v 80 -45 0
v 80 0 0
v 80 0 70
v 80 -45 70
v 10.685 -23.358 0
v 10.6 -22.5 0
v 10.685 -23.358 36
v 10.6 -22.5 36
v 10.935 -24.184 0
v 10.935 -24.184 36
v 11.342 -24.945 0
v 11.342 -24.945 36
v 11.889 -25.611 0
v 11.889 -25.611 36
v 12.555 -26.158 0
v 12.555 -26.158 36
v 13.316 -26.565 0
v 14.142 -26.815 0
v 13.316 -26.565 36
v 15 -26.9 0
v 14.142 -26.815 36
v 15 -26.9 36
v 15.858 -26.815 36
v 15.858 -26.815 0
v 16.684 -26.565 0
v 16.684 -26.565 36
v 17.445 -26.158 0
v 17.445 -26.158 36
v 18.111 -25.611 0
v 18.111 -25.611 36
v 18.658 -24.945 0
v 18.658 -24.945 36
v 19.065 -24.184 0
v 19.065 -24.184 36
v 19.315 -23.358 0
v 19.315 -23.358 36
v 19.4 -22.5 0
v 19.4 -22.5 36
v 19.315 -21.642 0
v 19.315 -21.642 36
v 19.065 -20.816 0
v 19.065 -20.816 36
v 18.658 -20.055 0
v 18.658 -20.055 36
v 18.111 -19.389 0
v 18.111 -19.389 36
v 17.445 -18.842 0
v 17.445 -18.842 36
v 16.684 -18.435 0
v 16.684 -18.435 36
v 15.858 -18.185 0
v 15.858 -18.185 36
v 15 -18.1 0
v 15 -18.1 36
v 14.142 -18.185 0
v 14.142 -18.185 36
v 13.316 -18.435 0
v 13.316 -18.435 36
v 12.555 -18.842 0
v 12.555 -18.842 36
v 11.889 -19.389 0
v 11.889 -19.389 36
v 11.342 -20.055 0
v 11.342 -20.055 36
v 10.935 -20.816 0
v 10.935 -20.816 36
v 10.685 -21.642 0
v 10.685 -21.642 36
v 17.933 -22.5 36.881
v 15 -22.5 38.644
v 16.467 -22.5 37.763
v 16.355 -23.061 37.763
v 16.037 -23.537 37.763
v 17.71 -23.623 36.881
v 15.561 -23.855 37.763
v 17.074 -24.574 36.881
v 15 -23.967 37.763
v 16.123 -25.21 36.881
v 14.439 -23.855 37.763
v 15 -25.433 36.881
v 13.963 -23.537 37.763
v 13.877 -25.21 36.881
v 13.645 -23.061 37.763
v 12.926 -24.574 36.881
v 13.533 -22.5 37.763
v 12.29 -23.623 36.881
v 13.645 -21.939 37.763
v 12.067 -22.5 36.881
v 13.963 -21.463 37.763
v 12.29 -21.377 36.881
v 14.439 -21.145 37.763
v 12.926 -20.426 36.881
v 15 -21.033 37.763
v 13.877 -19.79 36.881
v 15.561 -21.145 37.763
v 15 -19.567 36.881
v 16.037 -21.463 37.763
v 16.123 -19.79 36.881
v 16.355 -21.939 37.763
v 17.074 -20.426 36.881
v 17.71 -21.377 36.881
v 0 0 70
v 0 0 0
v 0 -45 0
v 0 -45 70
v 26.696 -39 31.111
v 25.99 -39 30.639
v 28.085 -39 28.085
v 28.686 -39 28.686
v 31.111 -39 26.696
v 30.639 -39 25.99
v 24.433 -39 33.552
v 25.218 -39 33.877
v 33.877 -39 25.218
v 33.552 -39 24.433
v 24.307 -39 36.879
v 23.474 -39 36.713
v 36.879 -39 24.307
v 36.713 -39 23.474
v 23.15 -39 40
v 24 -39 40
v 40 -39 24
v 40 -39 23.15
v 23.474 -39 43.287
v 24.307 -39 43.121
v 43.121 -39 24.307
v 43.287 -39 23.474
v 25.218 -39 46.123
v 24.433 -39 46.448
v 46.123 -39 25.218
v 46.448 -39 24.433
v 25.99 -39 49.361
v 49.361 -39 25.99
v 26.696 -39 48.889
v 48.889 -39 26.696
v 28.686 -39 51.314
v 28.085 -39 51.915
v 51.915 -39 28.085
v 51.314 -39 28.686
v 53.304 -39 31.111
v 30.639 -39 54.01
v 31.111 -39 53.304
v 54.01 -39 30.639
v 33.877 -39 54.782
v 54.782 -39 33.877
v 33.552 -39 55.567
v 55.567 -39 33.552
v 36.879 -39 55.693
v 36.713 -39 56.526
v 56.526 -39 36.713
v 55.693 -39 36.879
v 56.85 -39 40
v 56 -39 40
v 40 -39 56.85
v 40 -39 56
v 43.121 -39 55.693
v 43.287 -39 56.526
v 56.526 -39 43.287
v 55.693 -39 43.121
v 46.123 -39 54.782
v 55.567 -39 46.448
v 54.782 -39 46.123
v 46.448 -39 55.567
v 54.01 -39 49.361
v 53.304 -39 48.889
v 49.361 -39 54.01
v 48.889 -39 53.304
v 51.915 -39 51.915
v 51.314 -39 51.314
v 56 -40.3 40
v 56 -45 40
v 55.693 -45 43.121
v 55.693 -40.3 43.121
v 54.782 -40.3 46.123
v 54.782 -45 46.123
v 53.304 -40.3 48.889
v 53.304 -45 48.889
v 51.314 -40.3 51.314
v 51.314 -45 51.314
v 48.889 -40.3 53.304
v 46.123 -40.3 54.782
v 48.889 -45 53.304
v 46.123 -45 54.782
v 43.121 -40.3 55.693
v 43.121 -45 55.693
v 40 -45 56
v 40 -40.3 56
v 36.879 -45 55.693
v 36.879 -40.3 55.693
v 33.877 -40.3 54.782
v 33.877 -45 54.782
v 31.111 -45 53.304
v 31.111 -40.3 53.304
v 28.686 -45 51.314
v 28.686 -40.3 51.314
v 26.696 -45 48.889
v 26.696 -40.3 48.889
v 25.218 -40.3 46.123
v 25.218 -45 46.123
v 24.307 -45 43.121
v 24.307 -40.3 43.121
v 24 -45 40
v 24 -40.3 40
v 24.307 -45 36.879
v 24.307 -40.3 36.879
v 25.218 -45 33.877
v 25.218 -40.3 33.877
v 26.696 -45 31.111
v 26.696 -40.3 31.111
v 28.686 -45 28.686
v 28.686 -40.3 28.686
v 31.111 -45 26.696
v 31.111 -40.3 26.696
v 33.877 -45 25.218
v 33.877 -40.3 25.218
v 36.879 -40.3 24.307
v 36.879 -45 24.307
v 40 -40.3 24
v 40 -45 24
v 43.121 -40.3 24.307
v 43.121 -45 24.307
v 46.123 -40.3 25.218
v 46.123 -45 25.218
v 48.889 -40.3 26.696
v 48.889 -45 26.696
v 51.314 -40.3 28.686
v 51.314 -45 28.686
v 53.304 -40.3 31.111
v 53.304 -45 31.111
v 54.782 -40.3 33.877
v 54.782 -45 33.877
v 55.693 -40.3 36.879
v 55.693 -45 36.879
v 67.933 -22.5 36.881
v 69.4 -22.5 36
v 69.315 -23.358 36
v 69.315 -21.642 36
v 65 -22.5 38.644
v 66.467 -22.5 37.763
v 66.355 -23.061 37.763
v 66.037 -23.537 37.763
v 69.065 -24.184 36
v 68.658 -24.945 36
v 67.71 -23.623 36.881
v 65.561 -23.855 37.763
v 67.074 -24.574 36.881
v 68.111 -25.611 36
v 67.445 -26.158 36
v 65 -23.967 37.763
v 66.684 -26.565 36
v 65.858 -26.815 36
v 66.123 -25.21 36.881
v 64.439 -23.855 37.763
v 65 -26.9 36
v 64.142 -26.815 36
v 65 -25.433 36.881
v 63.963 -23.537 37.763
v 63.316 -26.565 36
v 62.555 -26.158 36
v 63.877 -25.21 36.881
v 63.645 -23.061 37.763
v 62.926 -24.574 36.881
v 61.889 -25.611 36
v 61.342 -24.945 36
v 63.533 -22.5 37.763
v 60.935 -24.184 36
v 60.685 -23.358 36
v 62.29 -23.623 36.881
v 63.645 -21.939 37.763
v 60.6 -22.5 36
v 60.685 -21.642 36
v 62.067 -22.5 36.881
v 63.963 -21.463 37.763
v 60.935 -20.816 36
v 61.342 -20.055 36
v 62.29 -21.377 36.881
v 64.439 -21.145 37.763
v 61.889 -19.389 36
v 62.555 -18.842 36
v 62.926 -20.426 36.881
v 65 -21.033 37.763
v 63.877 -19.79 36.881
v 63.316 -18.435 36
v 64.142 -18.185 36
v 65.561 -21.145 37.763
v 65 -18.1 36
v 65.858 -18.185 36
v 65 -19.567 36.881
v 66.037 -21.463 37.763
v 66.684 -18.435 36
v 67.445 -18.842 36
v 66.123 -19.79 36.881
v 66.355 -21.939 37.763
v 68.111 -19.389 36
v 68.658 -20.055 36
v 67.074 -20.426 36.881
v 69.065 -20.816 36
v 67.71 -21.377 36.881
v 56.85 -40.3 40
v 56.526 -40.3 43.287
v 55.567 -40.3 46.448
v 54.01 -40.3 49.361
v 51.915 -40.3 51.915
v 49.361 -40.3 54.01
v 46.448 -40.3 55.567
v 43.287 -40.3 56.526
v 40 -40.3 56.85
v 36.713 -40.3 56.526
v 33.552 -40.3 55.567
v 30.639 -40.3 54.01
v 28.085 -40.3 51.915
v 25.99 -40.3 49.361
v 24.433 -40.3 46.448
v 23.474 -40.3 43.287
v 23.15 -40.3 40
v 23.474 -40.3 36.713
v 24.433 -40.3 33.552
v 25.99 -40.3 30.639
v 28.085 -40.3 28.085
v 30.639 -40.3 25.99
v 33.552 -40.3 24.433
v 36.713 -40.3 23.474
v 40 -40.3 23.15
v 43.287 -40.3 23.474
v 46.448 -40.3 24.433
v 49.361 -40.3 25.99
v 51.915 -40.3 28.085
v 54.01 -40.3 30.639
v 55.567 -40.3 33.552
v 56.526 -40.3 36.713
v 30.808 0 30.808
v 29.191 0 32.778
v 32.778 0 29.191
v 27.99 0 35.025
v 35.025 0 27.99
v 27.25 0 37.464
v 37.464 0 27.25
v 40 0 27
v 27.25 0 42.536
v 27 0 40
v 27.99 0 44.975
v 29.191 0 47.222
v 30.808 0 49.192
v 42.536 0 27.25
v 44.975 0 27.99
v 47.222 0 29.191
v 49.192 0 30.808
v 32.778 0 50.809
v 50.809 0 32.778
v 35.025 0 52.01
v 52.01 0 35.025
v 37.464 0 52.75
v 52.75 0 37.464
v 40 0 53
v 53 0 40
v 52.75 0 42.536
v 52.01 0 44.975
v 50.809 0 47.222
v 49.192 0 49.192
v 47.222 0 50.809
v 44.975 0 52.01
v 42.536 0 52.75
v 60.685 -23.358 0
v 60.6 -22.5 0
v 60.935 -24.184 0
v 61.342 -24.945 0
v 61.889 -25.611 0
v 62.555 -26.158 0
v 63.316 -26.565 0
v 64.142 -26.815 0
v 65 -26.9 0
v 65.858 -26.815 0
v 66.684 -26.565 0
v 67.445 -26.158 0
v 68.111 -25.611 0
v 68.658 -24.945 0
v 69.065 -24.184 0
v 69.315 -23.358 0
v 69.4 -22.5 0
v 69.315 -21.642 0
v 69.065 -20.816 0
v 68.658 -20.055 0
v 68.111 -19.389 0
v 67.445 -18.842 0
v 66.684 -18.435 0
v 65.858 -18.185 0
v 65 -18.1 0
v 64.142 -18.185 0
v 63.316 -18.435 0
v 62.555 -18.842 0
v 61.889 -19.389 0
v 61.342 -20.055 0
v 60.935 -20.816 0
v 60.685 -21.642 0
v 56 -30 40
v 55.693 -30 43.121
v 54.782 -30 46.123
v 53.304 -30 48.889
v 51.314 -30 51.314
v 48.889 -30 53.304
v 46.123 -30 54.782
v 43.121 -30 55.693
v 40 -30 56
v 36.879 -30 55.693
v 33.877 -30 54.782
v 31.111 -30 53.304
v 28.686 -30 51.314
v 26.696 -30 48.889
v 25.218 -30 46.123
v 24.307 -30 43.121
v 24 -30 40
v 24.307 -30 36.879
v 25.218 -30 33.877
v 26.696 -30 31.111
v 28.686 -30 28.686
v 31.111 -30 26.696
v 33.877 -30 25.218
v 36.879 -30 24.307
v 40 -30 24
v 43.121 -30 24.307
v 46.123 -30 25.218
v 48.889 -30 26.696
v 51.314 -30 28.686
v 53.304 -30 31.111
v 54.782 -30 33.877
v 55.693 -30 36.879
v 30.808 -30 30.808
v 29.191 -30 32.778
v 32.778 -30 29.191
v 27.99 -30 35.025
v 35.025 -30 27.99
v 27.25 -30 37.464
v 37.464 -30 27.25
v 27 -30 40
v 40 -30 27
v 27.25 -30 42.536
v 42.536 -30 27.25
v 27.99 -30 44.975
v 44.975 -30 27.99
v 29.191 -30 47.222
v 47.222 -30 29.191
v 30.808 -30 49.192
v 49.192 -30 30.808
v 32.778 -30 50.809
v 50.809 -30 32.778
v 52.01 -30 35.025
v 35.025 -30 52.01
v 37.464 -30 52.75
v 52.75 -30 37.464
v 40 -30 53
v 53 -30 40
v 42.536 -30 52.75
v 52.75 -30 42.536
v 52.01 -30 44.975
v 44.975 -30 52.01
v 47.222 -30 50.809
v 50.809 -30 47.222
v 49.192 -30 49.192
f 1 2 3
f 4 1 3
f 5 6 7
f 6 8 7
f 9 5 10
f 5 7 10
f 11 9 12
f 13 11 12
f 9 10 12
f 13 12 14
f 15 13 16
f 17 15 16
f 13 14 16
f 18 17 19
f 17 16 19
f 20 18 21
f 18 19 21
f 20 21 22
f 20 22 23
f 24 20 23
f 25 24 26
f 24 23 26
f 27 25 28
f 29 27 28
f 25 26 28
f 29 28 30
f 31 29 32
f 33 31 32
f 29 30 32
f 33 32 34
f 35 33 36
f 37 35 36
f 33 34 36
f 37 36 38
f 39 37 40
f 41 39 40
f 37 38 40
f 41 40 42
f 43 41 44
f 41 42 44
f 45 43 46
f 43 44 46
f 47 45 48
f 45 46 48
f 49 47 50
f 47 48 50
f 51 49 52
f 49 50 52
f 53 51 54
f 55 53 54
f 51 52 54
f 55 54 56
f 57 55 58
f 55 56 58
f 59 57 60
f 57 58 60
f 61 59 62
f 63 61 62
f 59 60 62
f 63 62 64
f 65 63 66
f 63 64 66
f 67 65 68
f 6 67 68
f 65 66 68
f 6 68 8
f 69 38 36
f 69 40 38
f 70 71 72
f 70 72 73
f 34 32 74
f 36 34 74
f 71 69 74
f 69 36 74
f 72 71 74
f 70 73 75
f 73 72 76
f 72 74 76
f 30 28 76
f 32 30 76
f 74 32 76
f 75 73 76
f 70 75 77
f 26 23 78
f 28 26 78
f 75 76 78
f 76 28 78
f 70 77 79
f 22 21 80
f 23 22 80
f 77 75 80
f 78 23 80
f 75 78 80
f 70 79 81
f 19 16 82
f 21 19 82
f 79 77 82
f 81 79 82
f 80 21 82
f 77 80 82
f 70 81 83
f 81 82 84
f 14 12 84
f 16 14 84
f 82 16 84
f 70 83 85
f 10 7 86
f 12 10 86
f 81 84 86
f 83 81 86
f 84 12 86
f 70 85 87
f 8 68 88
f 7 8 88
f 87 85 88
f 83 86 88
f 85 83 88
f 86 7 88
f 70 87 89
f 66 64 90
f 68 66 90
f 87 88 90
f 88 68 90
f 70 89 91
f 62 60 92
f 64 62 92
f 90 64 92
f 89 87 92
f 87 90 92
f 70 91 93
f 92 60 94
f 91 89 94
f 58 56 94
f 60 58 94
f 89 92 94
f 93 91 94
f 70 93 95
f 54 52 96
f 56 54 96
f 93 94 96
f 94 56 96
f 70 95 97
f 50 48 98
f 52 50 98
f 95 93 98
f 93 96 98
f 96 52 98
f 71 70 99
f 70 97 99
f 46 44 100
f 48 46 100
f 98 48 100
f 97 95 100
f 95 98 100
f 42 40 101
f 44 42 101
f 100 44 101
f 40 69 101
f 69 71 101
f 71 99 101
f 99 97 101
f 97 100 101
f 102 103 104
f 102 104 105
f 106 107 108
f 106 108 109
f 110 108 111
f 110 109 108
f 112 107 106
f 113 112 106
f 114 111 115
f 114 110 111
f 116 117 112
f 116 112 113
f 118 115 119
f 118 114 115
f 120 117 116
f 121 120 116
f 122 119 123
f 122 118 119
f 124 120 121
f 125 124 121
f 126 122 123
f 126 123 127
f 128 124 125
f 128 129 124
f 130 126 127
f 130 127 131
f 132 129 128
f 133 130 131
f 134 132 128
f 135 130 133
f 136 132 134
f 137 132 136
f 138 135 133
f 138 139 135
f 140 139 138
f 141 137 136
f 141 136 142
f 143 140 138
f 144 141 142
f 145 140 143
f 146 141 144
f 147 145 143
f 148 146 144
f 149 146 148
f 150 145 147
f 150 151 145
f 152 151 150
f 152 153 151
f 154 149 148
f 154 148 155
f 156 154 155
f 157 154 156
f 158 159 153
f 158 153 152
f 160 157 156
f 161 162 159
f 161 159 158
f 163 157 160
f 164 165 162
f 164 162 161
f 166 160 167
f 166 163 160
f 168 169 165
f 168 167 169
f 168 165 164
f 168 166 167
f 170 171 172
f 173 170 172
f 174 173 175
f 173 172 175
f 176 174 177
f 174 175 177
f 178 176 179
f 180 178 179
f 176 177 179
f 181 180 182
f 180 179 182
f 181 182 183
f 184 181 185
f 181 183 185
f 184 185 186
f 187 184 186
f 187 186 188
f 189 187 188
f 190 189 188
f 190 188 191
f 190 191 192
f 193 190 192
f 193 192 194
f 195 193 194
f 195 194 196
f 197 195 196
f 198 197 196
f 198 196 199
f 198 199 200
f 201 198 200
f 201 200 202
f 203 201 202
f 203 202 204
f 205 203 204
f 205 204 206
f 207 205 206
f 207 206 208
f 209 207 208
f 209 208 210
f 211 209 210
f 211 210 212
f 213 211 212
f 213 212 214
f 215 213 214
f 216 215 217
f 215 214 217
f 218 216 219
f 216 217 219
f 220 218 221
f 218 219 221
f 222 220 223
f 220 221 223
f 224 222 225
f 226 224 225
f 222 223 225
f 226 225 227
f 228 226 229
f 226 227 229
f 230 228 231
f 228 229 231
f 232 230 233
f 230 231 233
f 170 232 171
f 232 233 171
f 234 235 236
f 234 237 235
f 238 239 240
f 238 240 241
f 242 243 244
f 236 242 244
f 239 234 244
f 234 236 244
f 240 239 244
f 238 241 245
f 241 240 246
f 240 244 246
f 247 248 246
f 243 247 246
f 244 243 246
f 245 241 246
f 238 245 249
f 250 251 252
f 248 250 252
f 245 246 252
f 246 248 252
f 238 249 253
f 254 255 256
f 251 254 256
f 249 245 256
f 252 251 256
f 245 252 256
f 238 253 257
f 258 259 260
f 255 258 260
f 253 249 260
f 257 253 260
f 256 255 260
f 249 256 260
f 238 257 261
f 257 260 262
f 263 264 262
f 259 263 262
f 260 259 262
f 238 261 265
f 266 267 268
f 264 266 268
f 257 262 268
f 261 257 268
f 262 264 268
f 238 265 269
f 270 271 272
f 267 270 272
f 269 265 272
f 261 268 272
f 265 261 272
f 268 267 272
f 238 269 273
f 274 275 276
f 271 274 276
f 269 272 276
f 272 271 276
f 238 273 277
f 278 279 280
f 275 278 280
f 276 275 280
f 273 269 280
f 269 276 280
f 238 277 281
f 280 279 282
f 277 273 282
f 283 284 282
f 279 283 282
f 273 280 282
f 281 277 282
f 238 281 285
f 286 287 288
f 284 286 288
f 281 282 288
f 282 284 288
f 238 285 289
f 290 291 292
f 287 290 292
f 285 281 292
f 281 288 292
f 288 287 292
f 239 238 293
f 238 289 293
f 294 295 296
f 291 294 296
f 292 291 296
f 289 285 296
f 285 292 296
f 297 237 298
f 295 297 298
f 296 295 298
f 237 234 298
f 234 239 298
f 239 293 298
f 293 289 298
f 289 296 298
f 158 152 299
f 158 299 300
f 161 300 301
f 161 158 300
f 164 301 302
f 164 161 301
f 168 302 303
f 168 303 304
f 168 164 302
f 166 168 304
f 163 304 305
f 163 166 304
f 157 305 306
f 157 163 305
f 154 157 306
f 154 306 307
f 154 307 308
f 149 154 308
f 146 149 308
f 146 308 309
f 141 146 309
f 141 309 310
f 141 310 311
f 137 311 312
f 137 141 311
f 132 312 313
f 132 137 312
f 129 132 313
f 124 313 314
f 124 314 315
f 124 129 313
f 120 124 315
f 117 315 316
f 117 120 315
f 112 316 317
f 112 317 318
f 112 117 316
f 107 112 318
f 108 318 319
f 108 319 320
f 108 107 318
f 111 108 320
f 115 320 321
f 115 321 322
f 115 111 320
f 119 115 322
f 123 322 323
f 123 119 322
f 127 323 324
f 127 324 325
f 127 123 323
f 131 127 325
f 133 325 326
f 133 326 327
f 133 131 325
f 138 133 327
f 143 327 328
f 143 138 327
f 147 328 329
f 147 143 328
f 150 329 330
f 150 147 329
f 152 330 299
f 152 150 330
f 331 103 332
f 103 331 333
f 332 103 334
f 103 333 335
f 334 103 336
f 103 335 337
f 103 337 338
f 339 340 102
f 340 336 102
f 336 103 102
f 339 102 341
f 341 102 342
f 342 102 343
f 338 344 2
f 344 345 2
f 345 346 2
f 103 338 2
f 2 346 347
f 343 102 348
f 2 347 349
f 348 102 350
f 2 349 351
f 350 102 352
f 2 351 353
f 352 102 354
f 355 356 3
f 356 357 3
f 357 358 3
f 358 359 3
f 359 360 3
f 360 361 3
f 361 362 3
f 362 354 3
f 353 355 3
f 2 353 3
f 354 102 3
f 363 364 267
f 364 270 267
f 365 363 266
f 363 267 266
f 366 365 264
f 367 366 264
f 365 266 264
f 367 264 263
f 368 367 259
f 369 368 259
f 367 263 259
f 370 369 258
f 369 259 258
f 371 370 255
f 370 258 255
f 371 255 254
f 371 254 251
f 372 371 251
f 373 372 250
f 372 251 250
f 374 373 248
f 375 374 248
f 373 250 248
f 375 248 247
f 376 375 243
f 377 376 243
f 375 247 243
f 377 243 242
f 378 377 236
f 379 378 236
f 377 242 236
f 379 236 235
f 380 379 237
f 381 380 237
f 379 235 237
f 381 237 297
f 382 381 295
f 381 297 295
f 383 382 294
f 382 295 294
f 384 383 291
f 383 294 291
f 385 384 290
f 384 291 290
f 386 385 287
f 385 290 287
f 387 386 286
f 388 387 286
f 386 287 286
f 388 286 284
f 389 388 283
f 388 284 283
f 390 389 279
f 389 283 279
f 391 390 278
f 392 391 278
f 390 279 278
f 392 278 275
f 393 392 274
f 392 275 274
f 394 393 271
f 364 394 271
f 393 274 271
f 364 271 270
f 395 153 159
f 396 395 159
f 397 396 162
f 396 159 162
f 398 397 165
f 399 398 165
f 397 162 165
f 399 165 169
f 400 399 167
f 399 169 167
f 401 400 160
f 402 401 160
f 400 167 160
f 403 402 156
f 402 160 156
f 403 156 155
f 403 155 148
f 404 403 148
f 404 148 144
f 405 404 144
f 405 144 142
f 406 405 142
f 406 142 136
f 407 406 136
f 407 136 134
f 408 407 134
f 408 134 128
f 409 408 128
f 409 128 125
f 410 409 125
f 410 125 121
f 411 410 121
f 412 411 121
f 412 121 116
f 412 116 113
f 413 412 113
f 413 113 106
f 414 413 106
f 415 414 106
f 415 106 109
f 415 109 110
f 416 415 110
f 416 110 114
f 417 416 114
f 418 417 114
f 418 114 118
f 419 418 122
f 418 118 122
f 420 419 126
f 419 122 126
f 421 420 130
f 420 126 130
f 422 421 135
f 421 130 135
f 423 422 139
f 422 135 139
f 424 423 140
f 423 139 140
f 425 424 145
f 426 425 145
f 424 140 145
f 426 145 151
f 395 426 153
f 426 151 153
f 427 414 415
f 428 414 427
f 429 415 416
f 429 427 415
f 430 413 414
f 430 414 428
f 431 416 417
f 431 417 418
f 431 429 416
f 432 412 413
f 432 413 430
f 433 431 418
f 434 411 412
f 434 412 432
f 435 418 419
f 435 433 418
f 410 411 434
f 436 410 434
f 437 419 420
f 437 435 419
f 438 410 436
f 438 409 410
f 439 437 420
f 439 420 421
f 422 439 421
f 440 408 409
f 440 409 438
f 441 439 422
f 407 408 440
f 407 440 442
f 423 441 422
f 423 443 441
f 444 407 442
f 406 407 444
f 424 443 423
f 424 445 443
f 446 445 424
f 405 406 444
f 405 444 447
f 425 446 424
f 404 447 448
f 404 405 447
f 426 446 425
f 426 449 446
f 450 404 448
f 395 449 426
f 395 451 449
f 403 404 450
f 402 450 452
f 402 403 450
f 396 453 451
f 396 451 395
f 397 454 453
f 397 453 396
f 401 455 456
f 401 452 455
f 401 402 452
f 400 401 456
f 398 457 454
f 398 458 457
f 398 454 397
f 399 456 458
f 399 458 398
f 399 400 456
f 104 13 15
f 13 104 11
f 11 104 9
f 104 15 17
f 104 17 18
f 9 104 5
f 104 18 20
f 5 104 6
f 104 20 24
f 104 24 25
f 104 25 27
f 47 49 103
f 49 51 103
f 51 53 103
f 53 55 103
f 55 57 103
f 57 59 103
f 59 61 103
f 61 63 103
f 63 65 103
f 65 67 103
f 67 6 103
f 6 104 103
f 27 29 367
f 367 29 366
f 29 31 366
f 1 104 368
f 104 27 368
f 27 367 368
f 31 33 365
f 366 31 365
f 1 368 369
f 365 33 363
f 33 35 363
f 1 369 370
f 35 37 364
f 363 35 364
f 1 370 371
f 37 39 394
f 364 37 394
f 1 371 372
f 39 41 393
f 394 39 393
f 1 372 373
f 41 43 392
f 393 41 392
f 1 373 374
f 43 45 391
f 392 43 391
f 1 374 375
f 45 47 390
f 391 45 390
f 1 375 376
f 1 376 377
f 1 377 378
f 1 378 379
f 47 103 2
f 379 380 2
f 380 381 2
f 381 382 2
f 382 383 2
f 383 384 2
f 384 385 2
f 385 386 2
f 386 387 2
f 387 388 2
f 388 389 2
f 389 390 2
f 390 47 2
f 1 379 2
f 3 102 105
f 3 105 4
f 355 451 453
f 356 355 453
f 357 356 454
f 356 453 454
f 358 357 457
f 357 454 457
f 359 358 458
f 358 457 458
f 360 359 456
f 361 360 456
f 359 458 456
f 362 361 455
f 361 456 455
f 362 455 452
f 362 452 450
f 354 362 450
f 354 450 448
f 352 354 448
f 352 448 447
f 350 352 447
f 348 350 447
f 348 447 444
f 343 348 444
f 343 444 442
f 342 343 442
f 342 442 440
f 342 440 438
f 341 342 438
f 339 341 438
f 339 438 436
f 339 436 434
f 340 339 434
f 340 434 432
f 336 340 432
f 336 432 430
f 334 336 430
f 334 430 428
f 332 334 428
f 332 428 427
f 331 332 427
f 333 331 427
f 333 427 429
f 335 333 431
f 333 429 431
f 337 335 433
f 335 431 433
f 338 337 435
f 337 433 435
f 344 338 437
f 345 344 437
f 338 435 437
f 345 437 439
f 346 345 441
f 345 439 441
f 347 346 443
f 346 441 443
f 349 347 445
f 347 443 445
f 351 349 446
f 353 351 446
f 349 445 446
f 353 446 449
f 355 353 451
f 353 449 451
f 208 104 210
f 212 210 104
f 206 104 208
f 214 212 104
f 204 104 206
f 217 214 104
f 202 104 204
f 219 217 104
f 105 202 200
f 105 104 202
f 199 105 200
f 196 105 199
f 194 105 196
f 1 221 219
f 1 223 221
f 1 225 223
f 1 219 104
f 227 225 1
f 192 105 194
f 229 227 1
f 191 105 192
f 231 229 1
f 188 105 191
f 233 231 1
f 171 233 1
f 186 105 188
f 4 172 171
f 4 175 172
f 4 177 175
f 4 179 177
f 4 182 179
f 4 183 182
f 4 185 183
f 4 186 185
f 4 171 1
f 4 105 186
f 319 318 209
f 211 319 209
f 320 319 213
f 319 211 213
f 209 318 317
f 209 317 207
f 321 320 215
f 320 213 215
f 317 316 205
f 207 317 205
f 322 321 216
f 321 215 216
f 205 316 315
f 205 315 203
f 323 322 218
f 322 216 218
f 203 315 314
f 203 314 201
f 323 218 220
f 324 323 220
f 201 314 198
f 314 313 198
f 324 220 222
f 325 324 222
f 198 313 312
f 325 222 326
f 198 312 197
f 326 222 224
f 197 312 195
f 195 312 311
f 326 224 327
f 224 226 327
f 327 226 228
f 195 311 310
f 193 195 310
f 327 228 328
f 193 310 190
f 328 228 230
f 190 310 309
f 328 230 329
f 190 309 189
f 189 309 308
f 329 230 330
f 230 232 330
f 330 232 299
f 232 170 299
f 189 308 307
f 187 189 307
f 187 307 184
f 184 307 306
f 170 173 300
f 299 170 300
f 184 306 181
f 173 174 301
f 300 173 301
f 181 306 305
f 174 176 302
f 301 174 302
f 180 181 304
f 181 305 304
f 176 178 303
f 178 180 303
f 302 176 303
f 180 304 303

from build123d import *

# Parameters (mm, degrees)
F0_W      = 80
F0_H      = 70
F1_DEPTH  = 45
F2_R      = 13
F3_DEPTH  = 45.001
F4_R      = 16
F4_R_2    = 13
F5_DEPTH  = 15
F7_R      = 16.85
F8_DEPTH  = 1.3
F10_D     = 8.8
F10_DEPTH = 36
F10_TIP   = 2.6437867237


with BuildPart() as f1:
    # F0 (on Front) → F1 (new body)
    with BuildSketch(Plane.XZ):
        with Locations((40, 35)):
            Rectangle(F0_W, F0_H)
    extrude(amount=F1_DEPTH)

    # F2 (on face) → F3 (cut, through all)
    with BuildSketch(Plane.XZ.offset(45)):
        with Locations((40, 40)):
            Circle(F2_R)
    extrude(amount=-F3_DEPTH, mode=Mode.SUBTRACT)

    # F4 (on face) → F5 (cut)
    with BuildSketch(Plane.XZ.offset(45)):
        with Locations((40, 40)):
            Circle(F4_R)
        with Locations((40, 40)):
            Circle(F4_R_2, mode=Mode.SUBTRACT)
    extrude(amount=-F5_DEPTH, mode=Mode.SUBTRACT)

    # F7 (on offset) → F8 (cut)
    with BuildSketch(Plane.XZ.offset(39)):
        with Locations((40, 40)):
            Circle(F7_R)
    extrude(amount=F8_DEPTH, mode=Mode.SUBTRACT)

    # F10
    with Locations(Plane(origin=(0, 0, 0), x_dir=(1, 0, 0), z_dir=(0, 0, -1))):
        with Locations((15, 22.5), (65, 22.5)):
            Hole(F10_D / 2, depth=F10_DEPTH)
            with Locations((0, 0, -(F10_DEPTH + F10_TIP / 2))):  # 118° drill point
                Cone(0, F10_D / 2, F10_TIP, mode=Mode.SUBTRACT)


solid = f1.part
